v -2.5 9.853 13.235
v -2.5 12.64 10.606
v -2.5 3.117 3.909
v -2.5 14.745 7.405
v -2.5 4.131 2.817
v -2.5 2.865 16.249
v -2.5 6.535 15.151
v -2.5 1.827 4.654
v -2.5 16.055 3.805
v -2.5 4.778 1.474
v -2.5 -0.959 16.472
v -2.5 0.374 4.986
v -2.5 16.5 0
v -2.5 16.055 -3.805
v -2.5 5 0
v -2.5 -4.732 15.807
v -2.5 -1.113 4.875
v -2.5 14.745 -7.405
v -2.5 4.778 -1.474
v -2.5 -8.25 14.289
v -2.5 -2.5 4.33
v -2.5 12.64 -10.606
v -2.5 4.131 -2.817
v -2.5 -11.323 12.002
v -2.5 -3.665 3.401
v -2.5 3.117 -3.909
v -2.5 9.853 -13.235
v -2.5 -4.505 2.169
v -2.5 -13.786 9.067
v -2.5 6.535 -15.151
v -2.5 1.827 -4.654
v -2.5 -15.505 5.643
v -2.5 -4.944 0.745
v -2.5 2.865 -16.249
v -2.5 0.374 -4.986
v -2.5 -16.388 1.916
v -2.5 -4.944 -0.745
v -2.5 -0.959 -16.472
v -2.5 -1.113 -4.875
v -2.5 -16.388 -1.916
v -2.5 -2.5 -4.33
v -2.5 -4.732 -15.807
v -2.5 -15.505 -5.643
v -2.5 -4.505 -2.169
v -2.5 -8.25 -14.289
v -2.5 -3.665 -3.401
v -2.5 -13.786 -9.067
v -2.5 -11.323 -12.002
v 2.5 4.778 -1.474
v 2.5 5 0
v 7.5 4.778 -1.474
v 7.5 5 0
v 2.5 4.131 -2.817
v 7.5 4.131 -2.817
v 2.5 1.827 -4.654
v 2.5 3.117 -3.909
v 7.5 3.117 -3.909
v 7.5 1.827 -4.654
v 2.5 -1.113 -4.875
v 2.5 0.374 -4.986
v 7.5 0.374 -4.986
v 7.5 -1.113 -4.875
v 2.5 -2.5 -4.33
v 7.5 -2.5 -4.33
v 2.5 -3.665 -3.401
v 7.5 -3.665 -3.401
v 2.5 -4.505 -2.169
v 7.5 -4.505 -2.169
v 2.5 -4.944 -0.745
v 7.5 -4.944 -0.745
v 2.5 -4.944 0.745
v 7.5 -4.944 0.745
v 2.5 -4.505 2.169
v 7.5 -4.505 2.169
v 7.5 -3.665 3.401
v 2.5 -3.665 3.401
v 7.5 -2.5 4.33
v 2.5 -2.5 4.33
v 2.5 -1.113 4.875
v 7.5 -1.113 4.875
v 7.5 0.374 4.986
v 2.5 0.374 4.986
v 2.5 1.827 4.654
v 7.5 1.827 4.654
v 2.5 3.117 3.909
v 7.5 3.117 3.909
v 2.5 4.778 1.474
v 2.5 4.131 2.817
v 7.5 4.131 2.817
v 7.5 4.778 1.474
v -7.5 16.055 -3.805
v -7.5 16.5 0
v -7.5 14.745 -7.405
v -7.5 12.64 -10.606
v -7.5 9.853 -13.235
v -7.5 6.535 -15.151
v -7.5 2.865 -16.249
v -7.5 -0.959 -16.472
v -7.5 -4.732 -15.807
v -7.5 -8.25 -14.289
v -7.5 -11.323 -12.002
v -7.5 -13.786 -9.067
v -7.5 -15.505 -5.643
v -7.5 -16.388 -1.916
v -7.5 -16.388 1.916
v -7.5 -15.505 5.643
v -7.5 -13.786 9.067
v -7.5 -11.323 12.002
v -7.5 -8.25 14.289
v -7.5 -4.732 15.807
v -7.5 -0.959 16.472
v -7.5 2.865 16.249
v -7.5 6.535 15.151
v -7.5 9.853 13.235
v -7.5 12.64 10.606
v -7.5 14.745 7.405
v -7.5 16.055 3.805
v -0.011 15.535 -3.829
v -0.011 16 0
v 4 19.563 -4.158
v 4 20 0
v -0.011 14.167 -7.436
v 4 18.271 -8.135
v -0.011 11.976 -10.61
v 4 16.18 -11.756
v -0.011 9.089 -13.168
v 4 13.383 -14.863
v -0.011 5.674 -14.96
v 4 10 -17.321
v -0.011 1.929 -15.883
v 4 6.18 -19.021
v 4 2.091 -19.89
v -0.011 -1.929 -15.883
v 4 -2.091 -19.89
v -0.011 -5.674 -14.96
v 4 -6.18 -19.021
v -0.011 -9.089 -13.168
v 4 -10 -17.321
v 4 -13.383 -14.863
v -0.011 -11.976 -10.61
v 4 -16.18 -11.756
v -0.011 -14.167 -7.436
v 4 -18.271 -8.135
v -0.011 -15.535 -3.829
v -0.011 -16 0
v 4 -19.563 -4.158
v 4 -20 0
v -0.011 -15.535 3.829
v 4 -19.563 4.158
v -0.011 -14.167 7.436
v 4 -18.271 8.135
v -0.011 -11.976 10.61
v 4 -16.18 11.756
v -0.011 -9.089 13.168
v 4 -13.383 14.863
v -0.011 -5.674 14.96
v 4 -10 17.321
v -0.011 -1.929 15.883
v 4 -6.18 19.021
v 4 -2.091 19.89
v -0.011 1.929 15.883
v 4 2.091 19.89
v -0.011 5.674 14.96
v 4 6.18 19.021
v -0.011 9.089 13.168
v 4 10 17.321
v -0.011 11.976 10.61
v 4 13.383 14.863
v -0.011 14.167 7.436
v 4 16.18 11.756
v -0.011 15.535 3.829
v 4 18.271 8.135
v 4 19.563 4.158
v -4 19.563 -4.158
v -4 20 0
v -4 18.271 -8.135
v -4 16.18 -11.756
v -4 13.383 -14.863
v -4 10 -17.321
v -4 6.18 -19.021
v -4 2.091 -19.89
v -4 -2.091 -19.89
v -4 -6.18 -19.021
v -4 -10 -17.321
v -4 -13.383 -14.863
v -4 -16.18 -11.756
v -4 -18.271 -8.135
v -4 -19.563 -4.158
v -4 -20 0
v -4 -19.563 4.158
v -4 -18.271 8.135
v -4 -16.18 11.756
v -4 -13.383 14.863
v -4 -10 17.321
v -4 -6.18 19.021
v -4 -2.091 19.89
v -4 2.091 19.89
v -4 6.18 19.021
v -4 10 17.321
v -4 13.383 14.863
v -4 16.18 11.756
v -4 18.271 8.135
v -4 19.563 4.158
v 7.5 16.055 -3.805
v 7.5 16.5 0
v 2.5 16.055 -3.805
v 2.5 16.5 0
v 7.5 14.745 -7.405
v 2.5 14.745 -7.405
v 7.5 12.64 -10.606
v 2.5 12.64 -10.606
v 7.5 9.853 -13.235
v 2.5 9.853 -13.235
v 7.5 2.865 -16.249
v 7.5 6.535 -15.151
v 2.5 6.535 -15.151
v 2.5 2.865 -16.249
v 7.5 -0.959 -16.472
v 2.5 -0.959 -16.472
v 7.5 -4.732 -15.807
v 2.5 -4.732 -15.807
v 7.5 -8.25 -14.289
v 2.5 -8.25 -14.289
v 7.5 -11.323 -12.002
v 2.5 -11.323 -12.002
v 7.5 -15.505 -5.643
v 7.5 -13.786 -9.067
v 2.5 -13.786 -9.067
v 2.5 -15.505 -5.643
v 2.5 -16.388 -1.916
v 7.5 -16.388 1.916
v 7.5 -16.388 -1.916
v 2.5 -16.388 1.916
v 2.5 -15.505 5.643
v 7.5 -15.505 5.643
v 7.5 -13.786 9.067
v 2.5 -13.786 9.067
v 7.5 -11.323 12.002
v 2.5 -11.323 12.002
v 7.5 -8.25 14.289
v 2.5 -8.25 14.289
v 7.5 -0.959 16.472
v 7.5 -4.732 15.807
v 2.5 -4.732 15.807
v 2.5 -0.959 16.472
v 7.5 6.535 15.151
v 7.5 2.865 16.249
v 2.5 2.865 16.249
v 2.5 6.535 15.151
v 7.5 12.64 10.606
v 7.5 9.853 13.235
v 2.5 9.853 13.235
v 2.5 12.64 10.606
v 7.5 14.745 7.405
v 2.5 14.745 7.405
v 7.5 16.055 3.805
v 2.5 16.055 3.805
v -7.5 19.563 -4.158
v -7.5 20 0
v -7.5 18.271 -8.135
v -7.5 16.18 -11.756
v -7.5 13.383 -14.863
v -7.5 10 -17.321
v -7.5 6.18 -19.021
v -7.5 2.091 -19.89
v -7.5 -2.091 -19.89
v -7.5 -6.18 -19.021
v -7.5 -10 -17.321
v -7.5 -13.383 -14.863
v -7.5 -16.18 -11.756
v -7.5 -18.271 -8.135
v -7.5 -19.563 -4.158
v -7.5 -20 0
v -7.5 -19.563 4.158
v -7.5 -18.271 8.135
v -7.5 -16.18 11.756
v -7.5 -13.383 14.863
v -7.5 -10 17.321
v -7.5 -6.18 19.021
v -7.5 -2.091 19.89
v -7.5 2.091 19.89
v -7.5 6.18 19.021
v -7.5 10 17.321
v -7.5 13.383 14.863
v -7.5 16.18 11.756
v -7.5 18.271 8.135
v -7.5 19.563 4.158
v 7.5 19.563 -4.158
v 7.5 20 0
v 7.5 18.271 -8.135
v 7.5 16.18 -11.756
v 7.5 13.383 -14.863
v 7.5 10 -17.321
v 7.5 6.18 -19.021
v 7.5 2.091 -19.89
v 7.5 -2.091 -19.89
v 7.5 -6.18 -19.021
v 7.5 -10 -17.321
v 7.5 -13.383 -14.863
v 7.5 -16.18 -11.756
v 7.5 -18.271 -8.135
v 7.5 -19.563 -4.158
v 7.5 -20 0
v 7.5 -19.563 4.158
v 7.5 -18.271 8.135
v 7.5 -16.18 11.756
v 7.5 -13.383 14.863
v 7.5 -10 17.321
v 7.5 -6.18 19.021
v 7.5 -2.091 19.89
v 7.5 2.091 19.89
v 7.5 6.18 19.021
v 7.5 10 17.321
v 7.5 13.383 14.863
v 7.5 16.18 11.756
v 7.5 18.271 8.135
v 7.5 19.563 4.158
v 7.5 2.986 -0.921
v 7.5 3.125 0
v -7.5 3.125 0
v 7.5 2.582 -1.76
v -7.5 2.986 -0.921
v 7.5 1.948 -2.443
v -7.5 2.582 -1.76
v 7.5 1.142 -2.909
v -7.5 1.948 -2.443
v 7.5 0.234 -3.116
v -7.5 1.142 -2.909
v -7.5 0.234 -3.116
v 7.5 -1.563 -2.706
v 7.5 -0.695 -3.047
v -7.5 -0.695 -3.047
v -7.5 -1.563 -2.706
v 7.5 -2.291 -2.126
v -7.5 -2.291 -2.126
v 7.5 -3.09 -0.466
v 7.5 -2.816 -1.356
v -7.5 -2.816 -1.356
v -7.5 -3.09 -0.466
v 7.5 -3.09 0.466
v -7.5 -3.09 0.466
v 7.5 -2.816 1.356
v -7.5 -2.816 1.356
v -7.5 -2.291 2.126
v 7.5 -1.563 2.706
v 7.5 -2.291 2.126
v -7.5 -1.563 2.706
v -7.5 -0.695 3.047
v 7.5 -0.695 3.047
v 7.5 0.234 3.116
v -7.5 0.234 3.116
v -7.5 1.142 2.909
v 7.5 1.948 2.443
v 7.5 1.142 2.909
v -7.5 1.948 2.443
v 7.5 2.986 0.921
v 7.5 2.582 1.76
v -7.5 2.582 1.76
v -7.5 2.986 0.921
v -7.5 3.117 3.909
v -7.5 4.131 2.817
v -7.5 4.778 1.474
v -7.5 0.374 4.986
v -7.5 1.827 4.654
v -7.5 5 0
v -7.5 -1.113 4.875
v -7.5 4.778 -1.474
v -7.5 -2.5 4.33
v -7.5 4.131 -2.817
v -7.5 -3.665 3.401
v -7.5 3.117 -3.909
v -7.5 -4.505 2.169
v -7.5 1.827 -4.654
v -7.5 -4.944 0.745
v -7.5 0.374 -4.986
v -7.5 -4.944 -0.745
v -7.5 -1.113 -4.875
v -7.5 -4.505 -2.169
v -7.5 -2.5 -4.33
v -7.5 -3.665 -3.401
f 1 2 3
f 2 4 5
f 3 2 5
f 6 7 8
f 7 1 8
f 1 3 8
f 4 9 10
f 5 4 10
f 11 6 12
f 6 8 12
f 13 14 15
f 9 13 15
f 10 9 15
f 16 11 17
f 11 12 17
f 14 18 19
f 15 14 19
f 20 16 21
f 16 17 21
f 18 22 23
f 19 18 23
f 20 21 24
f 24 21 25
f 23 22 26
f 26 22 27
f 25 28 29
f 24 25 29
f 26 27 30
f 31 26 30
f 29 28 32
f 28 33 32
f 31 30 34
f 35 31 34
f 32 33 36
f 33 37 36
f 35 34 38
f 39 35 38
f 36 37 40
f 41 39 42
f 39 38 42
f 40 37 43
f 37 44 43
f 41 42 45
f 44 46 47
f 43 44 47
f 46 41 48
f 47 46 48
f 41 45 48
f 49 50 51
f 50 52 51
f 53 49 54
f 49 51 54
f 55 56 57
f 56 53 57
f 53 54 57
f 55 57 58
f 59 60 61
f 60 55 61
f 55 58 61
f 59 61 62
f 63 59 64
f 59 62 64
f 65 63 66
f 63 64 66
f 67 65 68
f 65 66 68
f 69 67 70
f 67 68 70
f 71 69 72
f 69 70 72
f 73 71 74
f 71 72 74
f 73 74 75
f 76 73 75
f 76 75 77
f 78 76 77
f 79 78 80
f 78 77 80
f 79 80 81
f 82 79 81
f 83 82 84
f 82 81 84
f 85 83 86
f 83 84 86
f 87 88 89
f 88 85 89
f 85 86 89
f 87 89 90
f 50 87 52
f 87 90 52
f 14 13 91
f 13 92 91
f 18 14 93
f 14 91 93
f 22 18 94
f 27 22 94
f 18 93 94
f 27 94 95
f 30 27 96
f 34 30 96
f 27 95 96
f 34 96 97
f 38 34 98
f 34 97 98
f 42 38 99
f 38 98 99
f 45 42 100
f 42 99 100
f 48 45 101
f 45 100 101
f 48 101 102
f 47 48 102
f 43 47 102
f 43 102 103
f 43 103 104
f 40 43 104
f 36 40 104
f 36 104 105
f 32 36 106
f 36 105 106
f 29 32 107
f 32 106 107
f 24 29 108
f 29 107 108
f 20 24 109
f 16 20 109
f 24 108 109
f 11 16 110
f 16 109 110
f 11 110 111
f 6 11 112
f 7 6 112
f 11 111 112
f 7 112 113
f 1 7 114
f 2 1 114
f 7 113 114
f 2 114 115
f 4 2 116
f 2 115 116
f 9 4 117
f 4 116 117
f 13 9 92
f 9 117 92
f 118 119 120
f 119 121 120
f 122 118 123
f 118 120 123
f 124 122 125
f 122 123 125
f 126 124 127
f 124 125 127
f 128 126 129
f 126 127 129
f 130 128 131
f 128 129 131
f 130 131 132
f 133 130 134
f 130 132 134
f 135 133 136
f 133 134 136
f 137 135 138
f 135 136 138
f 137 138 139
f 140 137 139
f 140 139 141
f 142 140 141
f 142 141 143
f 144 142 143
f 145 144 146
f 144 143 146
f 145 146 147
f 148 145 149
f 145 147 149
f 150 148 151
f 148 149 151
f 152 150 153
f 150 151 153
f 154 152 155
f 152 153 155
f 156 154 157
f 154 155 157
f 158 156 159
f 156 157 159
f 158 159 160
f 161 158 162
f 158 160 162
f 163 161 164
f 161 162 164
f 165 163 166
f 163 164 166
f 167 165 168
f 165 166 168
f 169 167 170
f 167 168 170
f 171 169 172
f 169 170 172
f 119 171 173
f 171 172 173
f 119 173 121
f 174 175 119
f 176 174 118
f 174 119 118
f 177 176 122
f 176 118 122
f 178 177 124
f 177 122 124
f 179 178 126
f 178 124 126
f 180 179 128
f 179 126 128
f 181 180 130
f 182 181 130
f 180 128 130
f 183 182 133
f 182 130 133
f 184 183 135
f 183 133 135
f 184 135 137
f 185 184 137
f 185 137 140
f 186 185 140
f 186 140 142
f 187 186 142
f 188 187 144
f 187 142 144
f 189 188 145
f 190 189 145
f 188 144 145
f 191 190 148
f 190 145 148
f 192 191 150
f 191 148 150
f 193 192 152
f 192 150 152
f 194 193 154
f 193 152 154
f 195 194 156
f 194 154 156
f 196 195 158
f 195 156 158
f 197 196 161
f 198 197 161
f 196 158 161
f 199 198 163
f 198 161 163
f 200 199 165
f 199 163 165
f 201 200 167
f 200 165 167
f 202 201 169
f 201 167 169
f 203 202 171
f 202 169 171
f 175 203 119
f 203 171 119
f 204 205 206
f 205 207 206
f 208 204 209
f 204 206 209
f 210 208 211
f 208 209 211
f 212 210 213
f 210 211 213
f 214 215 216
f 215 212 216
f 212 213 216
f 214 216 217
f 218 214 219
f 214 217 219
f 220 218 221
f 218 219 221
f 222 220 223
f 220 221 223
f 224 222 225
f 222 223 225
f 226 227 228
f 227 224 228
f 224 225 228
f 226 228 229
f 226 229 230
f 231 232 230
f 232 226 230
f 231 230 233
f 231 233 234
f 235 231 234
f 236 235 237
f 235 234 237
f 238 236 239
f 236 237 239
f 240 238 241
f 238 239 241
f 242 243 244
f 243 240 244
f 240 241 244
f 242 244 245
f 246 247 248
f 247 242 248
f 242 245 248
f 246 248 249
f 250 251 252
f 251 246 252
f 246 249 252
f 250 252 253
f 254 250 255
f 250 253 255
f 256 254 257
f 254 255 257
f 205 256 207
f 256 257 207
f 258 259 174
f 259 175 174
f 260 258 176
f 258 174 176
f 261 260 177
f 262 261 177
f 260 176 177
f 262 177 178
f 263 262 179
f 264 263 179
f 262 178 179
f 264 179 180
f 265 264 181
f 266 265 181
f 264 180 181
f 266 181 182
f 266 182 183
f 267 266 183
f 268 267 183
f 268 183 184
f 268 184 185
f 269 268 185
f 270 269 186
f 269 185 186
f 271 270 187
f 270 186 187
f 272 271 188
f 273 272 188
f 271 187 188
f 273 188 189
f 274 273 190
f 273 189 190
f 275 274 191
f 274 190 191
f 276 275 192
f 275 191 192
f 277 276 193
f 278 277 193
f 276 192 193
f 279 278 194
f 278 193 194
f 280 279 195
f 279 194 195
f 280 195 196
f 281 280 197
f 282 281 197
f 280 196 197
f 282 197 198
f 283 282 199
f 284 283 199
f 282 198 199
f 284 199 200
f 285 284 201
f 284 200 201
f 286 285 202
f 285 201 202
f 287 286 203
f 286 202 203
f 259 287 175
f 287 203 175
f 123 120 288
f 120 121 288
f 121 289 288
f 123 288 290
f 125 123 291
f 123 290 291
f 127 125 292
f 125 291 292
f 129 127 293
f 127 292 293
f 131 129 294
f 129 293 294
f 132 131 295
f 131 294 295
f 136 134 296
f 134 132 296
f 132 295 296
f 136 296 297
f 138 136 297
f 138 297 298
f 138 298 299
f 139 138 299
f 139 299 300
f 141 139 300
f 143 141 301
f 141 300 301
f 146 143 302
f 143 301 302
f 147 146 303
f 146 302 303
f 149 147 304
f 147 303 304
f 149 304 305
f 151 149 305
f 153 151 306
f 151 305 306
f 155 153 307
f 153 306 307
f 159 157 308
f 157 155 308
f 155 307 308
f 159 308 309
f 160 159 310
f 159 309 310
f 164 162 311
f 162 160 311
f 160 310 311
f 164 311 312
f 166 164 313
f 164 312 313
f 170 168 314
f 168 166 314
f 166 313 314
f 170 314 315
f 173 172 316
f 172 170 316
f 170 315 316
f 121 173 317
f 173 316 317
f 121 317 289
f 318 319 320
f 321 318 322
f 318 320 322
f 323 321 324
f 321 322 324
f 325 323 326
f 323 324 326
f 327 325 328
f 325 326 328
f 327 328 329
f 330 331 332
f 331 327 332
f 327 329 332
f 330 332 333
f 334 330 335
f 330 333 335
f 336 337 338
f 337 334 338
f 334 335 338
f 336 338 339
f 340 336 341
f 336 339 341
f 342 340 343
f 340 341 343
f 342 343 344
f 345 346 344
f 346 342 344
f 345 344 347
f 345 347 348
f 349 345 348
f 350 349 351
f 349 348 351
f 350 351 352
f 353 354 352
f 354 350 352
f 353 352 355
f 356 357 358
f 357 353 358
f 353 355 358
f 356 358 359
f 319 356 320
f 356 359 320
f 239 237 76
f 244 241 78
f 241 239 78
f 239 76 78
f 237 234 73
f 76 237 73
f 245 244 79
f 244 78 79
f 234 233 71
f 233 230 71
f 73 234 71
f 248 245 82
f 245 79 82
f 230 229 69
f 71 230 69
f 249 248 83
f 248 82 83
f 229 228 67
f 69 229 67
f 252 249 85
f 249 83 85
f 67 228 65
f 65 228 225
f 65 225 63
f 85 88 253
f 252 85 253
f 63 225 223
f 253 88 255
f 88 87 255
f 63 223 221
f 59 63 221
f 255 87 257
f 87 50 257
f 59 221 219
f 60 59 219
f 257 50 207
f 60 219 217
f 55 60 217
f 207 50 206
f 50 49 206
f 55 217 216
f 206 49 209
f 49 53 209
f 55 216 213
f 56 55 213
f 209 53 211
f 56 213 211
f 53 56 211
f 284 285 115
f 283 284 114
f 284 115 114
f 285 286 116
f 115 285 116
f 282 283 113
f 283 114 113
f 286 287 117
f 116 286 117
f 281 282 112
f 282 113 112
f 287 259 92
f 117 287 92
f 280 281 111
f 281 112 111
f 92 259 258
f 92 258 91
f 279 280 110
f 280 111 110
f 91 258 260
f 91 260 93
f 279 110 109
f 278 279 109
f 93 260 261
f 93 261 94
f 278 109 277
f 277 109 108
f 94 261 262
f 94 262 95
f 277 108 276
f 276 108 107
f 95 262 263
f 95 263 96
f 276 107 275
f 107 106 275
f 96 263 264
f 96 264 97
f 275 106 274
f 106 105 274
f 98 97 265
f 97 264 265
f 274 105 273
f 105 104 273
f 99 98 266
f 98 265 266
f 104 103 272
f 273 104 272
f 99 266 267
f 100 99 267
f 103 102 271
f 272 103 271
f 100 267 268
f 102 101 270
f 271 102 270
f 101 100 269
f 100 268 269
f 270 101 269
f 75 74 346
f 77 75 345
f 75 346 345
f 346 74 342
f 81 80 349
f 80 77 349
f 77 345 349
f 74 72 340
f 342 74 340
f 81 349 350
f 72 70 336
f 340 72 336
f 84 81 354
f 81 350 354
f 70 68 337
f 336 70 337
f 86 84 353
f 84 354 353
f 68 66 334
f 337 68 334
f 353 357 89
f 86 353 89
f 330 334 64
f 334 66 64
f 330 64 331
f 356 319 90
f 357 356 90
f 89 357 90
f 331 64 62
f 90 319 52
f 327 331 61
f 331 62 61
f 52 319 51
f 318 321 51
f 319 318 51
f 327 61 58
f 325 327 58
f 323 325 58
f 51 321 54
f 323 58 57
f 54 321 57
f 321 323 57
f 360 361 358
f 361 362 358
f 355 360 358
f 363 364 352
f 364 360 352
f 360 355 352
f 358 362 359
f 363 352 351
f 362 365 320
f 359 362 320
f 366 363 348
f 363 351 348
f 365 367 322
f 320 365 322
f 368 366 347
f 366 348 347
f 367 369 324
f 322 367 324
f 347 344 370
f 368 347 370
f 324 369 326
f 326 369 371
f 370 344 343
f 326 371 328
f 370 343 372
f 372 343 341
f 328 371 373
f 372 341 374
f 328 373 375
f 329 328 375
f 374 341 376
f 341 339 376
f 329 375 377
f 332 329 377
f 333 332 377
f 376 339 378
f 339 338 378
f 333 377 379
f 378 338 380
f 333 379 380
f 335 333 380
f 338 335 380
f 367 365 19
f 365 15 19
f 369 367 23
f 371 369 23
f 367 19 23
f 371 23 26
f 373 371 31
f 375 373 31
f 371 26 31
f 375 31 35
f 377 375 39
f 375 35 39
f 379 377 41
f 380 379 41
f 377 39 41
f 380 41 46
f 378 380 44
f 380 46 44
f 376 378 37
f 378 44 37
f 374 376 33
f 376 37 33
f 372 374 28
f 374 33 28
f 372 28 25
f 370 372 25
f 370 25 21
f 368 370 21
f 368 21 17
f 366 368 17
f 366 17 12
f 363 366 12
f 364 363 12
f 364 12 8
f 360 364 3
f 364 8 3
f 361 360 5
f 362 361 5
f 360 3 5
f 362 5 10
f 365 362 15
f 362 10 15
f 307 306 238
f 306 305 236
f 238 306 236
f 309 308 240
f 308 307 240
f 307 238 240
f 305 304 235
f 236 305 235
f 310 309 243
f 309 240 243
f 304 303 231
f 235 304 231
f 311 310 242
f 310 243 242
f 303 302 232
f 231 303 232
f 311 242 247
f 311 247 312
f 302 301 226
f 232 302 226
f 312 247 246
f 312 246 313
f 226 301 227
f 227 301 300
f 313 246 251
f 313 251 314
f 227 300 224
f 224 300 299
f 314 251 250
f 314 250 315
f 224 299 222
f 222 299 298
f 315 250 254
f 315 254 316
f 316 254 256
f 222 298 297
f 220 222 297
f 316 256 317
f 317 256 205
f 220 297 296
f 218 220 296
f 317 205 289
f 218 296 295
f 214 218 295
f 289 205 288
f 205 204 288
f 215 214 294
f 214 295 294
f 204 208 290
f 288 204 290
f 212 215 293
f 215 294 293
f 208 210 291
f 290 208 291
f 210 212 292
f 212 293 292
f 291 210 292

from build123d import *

# Parameters (mm, degrees)
REVOLVE1_ANGLE = 360


with BuildPart() as part:
    # Sketch1 → Revolve1 (revolve, symmetric)
    with BuildSketch(Plane.XY) as revolve1_sk:
        Polygon((7.5, 3.125), (-7.5, 3.125), (-7.5, 5), (-2.5, 5), (-2.5, 16.5), (-7.5, 16.5), (-7.5, 20), (-4, 20), (-0.010995646, 16.000015113), (4, 20), (7.5, 20), (7.5, 16.5), (2.5, 16.5), (2.5, 5), (7.5, 5), align=None)
    revolve(axis=Axis((-7.5, 0, 0), (1, 0, 0)), revolution_arc=REVOLVE1_ANGLE / 2)
    revolve(revolve1_sk.sketch, axis=Axis((-7.5, 0, 0), (-1, 0, 0)), revolution_arc=REVOLVE1_ANGLE / 2)


solid = part.part
